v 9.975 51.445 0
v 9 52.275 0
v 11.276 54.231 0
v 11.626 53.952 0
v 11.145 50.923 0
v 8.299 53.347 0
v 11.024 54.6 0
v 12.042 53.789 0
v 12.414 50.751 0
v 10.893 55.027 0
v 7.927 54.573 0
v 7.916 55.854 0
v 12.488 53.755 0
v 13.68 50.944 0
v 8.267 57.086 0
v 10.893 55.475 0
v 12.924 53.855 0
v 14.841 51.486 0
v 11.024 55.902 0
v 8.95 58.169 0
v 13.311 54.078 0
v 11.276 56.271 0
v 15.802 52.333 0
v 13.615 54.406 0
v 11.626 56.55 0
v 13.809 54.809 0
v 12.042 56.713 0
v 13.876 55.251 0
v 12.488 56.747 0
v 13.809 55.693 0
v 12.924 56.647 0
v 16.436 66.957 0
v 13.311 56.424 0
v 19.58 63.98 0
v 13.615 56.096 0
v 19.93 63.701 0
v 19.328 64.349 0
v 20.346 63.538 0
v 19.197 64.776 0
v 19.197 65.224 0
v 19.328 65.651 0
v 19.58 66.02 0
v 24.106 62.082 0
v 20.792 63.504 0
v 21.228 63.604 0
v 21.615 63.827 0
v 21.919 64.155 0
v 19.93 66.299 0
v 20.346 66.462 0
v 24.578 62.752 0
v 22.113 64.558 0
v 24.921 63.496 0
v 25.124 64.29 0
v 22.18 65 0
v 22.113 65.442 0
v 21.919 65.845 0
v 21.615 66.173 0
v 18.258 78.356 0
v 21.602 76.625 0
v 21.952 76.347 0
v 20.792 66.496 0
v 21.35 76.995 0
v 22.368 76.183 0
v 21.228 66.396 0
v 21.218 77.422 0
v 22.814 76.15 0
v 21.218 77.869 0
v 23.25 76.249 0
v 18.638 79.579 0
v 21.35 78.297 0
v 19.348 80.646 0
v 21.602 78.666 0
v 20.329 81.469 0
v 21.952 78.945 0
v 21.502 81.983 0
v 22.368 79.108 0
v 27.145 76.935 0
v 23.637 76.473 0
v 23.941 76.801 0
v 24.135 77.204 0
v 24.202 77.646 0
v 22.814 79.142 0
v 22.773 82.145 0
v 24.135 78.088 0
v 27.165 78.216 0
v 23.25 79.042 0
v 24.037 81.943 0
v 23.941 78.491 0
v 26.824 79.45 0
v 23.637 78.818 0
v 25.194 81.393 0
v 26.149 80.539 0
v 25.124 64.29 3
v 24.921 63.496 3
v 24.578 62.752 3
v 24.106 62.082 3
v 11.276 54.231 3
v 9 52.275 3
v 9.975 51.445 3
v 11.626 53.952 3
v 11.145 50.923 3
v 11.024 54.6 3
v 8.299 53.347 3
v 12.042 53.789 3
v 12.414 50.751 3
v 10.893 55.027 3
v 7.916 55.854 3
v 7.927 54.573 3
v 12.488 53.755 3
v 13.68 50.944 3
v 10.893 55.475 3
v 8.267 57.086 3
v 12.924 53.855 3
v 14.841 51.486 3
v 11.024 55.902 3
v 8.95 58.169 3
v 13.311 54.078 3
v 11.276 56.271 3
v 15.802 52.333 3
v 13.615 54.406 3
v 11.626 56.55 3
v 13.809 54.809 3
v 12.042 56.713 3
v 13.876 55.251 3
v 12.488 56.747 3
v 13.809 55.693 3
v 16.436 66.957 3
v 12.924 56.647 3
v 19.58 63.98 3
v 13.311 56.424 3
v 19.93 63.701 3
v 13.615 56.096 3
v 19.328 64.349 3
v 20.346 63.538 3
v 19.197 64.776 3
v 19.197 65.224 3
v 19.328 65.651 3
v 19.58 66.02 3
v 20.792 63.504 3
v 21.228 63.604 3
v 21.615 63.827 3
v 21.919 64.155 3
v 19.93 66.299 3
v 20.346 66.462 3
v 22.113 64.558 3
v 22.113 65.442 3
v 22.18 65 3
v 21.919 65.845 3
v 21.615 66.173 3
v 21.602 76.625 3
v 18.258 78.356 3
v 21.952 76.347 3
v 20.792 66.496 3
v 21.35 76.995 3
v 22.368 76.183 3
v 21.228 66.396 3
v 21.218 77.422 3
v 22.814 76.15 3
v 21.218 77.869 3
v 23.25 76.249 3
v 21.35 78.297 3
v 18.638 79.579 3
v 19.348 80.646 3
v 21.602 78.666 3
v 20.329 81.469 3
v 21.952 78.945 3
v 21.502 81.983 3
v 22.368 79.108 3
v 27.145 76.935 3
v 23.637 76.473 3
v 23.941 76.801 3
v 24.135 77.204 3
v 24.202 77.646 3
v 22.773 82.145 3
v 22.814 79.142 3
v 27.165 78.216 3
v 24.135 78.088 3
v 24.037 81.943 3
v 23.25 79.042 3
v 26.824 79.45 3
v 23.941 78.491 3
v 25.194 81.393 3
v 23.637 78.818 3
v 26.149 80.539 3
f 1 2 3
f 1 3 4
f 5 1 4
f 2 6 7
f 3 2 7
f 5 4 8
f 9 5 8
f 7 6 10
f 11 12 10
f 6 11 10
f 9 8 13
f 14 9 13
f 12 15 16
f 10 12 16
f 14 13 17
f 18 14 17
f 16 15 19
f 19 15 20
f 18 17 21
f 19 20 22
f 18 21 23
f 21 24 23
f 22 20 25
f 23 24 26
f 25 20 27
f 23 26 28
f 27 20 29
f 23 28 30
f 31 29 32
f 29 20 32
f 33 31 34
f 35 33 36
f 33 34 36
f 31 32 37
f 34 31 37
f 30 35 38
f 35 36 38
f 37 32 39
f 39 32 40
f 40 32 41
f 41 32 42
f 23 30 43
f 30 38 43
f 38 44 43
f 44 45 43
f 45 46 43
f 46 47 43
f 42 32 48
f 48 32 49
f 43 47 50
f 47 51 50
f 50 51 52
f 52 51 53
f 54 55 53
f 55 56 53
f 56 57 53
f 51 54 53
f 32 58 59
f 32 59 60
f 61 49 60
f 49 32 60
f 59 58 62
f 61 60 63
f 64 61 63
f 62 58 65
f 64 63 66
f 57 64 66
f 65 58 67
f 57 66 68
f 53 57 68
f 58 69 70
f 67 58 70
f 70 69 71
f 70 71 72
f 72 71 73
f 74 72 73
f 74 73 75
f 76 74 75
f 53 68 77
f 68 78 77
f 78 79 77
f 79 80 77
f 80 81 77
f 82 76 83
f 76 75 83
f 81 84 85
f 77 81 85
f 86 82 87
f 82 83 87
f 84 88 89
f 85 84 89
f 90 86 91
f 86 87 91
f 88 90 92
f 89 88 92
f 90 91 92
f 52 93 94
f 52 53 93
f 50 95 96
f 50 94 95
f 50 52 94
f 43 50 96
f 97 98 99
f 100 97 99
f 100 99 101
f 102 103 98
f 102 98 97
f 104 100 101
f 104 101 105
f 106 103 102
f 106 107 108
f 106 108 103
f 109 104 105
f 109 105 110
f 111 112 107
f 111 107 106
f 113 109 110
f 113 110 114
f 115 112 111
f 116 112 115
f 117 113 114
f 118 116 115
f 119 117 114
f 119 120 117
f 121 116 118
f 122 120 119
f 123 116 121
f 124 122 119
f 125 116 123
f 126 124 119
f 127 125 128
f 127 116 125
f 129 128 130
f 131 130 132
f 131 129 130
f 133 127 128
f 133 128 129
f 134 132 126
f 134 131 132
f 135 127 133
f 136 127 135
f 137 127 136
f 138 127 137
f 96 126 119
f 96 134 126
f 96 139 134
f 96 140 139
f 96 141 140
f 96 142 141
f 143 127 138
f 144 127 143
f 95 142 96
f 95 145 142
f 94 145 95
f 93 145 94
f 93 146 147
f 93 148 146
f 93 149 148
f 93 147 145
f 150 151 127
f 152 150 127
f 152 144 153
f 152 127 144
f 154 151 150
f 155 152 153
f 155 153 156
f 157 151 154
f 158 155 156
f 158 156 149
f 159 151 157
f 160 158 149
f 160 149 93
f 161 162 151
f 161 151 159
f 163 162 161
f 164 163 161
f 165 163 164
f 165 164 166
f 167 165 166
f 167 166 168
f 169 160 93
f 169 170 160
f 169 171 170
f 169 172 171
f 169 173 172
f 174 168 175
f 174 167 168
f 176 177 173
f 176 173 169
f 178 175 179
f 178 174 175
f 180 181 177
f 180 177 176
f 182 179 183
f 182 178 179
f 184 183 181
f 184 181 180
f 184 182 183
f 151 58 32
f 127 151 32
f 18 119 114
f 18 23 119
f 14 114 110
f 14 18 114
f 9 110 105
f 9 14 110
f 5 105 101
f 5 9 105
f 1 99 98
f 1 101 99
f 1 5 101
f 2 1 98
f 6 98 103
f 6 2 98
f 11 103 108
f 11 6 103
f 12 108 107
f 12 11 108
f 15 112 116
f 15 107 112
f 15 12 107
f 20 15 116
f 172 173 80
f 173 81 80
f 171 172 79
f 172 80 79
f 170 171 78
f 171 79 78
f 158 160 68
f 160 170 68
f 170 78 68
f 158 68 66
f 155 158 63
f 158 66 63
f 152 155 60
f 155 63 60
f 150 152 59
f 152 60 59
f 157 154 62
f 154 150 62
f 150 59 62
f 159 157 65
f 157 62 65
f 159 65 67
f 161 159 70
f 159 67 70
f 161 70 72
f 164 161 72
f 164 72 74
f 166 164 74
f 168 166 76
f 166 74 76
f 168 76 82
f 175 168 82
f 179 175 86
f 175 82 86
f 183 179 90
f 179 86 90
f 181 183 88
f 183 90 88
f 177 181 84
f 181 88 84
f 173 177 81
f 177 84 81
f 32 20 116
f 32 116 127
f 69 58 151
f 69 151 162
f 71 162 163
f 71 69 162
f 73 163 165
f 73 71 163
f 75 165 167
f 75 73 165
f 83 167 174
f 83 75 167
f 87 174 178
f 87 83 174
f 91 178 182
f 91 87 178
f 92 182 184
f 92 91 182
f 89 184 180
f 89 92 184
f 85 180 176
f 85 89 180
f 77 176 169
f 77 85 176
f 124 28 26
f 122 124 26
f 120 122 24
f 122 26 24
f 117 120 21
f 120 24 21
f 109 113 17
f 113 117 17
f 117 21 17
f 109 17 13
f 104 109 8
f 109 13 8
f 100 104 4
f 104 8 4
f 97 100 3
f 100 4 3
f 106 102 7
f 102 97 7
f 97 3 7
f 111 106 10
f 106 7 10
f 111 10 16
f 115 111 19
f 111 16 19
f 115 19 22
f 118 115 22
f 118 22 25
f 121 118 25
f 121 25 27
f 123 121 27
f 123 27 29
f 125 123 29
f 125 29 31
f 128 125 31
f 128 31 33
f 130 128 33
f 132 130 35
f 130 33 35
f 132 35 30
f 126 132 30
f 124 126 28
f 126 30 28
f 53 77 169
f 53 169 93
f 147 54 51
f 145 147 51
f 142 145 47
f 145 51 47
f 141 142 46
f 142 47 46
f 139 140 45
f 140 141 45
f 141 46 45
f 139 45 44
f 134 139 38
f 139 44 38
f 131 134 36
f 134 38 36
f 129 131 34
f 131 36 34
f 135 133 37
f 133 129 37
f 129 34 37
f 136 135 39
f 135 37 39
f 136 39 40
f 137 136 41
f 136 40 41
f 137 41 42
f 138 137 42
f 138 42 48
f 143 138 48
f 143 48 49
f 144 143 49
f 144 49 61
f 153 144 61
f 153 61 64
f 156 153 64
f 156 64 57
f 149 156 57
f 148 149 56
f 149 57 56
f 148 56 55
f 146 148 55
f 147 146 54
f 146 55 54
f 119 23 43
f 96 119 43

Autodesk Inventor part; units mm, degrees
ref_plane "YZ Plane" through (0, 0, 0) normal (1, 0, 0) x (0, 1, 0)
ref_plane "XZ Plane" through (0, 0, 0) normal (0, 1, 0) x (-1, 0, 0)
ref_plane "XY Plane" through (0, 0, 0) normal (0, 0, 1) x (1, 0, 0)
sketch "スケッチ1" plane through (0, 0, 0) normal (0, 0, 1) x (1, 0, 0)
  circle A0 centre (12.3759, 55.251) radius 1.5
  circle A1 centre (22.7017, 77.6457) radius 1.5
  circle A2 centre (20.6799, 65) radius 1.5
  circle A3 centre (22.7017, 77.6457) radius 4.5
  circle A4 centre (20.6799, 65) radius 4.5
  circle A5 centre (12.3759, 55.251) radius 4.5
  line L0 (8.9502, 58.1689) -> (17.2542, 67.918)
  line L1 (18.2581, 78.3561) -> (16.2364, 65.7104)
  line L2 (27.1453, 76.9352) -> (25.1235, 64.2896)
  line L3 (15.8017, 52.333) -> (24.1057, 62.082)
  point P0 (0, 0)
  point P1 (0, 0)
  point P2 (16.4357, 66.957)
  dimension "d0" = 3
  dimension "d1" = 3
  dimension "d2" = 3
extrude "押し出し1" add sketch "スケッチ1" along normal blind 3
properties part number "段ばね抑え2" material "アセタール樹脂、白"
